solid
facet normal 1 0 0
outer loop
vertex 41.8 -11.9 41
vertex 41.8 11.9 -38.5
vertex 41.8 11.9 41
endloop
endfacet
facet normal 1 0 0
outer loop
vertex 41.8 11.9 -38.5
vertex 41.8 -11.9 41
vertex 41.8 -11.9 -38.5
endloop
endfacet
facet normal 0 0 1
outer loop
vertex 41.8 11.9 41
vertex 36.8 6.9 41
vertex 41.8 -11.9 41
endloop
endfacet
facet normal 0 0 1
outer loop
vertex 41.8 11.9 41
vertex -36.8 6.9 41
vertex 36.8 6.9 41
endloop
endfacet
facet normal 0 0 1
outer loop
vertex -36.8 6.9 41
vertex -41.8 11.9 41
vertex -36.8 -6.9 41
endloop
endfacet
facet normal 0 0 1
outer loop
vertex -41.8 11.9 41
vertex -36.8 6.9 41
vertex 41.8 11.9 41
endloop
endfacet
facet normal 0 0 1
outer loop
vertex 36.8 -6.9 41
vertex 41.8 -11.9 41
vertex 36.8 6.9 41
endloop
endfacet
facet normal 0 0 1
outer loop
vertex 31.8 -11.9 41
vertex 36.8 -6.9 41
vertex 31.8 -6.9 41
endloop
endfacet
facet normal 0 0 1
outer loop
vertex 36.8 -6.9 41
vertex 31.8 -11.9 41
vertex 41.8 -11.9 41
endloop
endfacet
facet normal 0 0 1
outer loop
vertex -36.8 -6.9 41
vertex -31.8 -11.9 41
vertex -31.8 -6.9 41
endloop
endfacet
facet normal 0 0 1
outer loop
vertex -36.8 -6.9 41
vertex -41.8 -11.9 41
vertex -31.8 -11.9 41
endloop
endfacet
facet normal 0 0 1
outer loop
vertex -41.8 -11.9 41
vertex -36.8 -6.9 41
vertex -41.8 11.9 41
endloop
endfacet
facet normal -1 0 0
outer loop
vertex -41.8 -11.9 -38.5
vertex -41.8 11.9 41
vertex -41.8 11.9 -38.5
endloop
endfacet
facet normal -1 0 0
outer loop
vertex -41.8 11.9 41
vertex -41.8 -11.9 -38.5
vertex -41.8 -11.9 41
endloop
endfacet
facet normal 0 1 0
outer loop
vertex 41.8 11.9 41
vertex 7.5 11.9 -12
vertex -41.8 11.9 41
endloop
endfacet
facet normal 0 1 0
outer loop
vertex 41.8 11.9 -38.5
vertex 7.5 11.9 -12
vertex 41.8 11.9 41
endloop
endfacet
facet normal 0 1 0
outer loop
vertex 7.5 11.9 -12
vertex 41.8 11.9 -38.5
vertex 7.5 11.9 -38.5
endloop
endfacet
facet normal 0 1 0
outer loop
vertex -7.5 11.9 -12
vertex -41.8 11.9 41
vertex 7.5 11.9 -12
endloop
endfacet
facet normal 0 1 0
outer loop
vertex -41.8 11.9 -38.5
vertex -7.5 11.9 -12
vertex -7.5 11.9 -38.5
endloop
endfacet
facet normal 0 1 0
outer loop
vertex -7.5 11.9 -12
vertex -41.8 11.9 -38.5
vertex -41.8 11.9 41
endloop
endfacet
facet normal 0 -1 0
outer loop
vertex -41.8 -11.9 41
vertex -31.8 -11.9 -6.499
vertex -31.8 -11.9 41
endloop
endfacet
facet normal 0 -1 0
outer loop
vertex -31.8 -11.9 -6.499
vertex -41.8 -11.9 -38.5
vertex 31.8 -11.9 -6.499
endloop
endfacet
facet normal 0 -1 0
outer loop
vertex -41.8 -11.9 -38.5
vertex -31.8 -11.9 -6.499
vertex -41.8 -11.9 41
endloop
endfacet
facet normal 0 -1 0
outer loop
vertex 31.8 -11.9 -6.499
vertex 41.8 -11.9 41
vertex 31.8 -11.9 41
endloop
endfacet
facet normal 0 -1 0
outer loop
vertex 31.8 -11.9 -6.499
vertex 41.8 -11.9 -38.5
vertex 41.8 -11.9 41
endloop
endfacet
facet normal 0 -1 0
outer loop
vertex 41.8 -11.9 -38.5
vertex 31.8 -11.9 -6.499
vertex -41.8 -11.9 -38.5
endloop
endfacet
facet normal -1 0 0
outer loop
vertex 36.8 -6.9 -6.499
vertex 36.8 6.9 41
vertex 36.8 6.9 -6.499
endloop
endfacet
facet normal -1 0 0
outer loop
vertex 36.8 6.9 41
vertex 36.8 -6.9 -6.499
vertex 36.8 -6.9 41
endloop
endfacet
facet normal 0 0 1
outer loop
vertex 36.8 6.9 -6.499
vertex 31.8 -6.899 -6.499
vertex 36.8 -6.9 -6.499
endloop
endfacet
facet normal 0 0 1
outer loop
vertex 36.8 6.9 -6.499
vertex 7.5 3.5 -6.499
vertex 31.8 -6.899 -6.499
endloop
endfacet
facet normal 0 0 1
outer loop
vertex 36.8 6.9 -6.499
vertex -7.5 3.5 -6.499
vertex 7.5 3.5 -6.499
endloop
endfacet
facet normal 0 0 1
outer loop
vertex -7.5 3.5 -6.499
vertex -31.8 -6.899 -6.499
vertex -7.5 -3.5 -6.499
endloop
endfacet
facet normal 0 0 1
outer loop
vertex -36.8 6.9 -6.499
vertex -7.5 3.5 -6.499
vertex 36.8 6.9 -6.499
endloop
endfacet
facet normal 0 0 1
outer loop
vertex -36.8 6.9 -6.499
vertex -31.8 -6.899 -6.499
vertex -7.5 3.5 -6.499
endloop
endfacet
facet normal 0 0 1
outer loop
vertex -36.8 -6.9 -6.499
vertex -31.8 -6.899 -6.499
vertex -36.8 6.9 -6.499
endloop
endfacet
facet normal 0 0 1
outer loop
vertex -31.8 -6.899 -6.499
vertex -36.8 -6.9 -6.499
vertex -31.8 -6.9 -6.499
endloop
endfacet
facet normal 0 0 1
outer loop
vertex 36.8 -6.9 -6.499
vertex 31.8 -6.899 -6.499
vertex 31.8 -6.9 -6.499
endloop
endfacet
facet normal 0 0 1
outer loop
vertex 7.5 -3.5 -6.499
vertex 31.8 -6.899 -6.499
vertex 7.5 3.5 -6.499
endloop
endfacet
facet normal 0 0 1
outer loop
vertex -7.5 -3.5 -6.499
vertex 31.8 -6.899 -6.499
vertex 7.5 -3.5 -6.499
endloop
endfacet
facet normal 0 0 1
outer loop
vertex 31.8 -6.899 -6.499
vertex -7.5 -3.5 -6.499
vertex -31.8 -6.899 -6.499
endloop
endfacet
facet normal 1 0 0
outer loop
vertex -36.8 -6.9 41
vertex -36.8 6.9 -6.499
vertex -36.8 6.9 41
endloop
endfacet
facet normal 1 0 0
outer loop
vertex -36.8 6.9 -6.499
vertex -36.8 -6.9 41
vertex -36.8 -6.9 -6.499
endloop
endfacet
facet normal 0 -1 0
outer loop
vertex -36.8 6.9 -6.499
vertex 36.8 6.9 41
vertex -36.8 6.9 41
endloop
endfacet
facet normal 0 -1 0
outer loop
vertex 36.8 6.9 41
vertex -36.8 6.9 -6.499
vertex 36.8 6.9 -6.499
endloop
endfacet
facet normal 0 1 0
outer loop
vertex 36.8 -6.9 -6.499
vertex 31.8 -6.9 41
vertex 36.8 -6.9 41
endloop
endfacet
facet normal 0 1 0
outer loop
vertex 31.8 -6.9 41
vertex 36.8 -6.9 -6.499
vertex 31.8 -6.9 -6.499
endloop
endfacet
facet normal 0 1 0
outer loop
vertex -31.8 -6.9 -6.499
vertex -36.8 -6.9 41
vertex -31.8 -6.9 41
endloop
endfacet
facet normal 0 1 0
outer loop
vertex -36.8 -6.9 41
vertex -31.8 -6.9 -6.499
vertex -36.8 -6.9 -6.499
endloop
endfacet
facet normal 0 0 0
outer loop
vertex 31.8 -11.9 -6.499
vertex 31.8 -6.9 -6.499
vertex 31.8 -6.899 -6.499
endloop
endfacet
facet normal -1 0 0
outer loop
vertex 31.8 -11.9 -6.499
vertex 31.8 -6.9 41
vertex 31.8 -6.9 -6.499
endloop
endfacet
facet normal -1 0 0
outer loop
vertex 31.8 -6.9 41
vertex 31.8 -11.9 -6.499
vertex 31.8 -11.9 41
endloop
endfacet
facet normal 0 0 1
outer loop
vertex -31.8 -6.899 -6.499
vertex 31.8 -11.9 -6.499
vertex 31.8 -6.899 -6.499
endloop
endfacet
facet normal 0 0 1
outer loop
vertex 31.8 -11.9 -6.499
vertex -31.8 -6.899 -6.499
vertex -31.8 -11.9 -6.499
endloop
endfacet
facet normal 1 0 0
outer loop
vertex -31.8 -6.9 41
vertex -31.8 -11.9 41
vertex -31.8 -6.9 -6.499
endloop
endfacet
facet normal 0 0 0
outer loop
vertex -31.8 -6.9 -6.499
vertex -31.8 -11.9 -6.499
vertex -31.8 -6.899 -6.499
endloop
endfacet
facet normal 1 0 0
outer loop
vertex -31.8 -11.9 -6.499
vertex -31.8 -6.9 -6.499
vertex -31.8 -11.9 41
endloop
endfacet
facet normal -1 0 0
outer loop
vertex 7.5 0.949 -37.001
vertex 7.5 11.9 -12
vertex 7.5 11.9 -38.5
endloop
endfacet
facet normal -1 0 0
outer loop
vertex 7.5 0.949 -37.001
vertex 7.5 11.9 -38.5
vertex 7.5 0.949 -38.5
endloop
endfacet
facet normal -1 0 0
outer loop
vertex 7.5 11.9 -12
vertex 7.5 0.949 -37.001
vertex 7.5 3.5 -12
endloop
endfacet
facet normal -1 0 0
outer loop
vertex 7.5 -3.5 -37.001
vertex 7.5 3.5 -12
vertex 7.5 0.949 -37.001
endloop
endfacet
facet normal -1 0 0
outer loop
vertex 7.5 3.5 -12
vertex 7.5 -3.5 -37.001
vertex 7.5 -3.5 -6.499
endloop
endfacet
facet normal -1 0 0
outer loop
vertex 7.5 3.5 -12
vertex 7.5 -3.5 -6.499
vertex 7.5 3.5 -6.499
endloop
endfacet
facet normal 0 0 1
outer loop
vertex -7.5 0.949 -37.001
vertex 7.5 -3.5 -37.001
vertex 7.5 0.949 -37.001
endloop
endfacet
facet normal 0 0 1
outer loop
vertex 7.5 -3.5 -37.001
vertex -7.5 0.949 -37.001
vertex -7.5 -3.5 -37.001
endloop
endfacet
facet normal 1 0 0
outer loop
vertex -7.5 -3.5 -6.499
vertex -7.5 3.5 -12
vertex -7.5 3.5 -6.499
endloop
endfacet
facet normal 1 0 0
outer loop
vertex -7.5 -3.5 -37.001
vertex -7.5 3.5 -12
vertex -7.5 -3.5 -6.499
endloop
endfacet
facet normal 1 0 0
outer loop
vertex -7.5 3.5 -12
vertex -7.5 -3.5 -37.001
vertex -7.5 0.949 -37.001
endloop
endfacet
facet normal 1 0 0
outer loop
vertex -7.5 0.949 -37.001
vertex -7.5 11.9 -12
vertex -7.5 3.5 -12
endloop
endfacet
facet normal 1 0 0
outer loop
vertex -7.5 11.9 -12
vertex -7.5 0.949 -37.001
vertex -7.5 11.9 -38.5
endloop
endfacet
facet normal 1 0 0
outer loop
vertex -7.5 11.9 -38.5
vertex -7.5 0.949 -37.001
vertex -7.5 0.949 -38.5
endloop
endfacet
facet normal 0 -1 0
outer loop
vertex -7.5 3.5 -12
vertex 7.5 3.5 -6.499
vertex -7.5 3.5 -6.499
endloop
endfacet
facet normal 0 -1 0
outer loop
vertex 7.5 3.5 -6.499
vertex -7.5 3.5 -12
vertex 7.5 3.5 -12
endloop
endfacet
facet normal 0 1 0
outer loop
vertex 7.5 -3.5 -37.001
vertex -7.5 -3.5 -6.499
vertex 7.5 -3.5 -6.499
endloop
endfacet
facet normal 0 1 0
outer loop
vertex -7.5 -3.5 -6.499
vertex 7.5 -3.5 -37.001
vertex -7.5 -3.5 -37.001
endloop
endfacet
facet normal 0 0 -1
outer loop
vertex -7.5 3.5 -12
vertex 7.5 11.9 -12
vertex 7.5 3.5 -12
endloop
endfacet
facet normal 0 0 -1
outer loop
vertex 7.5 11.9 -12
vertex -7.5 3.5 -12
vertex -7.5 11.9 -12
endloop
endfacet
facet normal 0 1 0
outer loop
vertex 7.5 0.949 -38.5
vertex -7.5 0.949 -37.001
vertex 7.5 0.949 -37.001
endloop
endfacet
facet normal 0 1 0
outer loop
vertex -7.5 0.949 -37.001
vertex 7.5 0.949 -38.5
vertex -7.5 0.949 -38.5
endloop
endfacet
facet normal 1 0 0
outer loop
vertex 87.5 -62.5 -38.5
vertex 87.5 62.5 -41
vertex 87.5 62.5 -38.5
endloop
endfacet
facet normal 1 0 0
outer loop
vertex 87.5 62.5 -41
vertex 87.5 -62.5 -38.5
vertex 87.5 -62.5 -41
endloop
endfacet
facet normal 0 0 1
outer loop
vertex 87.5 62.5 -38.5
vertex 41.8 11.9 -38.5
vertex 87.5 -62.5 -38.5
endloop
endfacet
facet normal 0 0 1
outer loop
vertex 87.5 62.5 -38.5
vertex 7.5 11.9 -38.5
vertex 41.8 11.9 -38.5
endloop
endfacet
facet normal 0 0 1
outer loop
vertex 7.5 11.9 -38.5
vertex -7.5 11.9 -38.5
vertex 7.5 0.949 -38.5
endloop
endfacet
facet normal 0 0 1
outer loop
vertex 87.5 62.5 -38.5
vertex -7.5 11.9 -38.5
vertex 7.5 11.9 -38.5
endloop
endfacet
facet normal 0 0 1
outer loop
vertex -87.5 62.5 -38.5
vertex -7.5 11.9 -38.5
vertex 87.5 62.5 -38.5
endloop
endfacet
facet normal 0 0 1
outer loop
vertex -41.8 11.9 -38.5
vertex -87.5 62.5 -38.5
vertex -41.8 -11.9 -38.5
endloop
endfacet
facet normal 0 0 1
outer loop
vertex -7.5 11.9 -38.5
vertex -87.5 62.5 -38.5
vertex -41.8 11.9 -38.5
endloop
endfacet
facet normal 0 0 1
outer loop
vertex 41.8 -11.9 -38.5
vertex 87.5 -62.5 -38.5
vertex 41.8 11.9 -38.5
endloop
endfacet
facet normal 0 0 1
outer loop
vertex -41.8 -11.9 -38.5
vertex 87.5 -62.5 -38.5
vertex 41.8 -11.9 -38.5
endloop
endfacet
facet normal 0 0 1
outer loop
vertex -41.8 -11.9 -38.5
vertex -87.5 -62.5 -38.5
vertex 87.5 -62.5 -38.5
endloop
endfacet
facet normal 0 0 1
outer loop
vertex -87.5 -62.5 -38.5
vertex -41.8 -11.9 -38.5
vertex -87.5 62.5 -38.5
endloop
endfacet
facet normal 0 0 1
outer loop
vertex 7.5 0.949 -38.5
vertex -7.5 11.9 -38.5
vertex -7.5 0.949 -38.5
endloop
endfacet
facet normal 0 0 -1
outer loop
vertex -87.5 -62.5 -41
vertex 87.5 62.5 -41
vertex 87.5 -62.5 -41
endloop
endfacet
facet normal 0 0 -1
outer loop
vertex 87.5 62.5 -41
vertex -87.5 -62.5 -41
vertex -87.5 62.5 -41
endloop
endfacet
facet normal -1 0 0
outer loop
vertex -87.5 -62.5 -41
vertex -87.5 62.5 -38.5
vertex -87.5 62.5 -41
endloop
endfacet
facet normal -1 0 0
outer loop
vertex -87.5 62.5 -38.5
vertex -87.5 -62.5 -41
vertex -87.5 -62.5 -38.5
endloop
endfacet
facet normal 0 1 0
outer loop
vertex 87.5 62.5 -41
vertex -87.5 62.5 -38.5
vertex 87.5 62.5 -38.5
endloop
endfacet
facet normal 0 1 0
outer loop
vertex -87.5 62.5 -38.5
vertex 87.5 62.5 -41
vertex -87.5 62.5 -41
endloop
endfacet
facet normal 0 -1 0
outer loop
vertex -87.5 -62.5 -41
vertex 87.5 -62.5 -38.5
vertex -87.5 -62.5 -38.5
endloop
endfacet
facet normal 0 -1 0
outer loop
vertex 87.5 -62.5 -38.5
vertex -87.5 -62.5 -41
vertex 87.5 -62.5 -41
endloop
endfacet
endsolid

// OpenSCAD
$fa = 1;
$fs = 0.1;

phone_width=73.6;
phone_thickness=13.8;
holder_height=50;
base_height=27;
wall_thickness=5;
charger_width=15;
charger_thickness=7;

module holder() {
    difference() {
        cube([
            phone_width + (wall_thickness * 2),
            phone_thickness + (wall_thickness * 2),
            holder_height + base_height + wall_thickness
        ], center=true);

        translate([0, 0, wall_thickness + (base_height / 2) + 0.001])
            cube([
                phone_width,
                phone_thickness,
                holder_height
            ], center=true);

        translate([0, -1 * ((phone_thickness / 2) + (wall_thickness / 2)), (base_height / 2) + wall_thickness + 0.001])
            cube([
                phone_width - (wall_thickness * 2),
                wall_thickness + 0.002,
                holder_height + 0.001
            ], center=true);
    }
}

difference() {
    holder();

    translate([0, 0, -1 * ((base_height / 2) + wall_thickness)])
        cube([charger_width, charger_thickness, base_height + 10.002], center=true);

    translate([0, (phone_thickness/2), -1 * base_height])
        cube([charger_width, (phone_thickness / 2) + wall_thickness + 0.002, 30], center=true);
}

translate([0, 0, -1 * (base_height + wall_thickness + 7.75)])
    cube([175, 125, 2.5002], center=true);
